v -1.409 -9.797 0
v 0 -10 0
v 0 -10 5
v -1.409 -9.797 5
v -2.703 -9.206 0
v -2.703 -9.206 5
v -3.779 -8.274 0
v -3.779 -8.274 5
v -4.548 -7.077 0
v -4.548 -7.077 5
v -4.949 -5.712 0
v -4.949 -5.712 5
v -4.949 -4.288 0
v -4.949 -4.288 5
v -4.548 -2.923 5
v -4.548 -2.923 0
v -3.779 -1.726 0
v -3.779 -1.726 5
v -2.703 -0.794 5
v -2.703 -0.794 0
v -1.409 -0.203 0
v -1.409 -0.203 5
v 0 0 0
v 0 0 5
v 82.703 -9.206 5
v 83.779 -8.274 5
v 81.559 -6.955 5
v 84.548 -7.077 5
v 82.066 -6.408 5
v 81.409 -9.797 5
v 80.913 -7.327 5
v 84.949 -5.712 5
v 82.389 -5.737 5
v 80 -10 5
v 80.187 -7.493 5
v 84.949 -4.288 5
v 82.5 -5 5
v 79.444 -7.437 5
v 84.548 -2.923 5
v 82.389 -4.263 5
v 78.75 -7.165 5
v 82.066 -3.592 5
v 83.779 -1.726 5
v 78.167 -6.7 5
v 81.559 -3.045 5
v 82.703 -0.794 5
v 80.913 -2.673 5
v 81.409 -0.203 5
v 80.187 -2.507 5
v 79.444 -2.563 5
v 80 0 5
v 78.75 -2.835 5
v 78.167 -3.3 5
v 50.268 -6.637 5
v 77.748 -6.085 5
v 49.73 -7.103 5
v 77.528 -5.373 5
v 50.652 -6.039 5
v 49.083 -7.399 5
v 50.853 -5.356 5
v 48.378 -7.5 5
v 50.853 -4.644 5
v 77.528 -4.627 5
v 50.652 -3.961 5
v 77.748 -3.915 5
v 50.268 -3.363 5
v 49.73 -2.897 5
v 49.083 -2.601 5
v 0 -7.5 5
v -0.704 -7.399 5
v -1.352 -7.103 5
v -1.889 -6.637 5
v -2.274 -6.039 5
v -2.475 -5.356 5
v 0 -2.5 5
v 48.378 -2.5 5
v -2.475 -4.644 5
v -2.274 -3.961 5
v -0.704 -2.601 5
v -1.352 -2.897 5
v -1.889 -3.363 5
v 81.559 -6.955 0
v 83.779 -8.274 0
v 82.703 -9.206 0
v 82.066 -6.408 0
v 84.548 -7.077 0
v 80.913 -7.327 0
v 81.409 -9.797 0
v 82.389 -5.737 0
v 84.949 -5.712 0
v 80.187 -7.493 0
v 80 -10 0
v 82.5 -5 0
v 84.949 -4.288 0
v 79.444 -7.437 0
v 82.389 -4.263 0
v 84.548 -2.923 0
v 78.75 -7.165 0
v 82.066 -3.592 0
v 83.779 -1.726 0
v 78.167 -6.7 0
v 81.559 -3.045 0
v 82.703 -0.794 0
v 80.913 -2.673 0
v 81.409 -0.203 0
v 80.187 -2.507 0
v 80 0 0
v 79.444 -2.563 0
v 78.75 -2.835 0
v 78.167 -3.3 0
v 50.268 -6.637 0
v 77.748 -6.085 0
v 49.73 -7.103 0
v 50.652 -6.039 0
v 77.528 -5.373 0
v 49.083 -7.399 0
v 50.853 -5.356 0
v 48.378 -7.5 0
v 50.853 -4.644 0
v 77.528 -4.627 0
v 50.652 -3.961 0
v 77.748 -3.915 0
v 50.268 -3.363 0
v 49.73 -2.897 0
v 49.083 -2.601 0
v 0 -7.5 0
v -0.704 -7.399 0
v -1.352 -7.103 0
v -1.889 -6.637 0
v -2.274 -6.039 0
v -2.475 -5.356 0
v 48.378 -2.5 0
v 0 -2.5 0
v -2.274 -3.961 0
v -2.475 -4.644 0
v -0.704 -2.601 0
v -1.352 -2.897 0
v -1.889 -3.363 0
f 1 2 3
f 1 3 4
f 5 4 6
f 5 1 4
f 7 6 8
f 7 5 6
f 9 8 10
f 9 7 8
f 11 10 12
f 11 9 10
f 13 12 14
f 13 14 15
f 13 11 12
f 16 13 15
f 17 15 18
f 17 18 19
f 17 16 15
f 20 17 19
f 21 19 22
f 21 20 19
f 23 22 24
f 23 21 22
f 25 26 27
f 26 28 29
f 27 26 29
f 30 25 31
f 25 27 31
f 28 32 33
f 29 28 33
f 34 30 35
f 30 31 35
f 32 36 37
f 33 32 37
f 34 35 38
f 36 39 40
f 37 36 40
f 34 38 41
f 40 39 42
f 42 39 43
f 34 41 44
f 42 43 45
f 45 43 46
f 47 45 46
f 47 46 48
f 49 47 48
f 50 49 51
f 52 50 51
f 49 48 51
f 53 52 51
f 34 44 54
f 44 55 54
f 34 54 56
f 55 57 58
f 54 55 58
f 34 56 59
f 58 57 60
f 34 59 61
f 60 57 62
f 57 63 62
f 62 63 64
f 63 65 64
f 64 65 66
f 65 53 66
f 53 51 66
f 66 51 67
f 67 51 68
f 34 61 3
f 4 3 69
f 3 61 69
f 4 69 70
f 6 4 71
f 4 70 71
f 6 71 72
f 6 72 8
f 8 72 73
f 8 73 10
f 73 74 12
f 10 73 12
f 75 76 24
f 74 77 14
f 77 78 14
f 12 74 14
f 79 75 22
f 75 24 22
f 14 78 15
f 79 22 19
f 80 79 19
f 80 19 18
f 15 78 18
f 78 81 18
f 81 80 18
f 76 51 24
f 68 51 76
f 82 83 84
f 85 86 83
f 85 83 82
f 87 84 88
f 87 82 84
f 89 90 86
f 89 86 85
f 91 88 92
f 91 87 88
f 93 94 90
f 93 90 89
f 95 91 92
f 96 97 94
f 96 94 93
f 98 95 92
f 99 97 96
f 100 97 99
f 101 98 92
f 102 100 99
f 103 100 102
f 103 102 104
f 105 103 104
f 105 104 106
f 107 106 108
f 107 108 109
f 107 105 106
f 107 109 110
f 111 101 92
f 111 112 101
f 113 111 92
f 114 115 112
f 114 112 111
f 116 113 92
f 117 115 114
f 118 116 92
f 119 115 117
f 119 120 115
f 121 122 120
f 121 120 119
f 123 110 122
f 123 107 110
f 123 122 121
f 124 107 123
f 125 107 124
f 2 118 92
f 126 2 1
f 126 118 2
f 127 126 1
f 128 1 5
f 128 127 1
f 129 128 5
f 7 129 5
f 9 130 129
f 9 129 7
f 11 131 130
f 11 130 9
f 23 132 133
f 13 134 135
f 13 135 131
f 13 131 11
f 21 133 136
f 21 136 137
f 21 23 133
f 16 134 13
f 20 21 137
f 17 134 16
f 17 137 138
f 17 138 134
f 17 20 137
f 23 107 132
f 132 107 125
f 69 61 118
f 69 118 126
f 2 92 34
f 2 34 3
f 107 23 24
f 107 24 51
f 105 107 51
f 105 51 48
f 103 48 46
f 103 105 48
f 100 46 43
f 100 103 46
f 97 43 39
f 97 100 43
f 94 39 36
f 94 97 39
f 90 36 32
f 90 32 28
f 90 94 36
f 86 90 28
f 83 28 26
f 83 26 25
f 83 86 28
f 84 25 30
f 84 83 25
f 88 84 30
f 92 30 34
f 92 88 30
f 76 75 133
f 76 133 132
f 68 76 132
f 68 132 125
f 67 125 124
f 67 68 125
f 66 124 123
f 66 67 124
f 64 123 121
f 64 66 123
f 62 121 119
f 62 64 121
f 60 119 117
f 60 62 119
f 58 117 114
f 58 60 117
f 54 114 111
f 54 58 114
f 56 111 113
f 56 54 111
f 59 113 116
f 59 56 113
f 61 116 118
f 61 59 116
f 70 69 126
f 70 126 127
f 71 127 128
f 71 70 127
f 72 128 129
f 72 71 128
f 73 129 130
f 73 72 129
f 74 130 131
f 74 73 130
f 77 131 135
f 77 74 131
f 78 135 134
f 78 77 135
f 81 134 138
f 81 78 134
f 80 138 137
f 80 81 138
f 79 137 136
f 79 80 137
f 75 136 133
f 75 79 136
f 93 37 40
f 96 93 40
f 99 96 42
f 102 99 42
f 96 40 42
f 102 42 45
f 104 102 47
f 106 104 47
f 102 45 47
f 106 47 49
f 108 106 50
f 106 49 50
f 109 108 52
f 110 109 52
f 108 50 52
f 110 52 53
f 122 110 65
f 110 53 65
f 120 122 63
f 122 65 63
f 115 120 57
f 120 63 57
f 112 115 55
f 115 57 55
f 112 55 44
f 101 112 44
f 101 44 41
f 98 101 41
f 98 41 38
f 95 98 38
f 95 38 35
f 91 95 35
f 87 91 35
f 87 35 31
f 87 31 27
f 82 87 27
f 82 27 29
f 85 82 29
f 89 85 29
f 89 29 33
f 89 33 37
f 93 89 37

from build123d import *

# Parameters (mm, degrees)
EXTRUDE_2_DEPTH     = 5
SKETCH_3_R          = 2.5
CUT_EXTRUDE_2_DEPTH = 15


with BuildPart() as part:
    # 草图2 → 凸台-拉伸2 (new body)
    with BuildSketch(Plane.XY):
        with BuildLine():
            Line((0, 0), (79.999999139, 0))
            ThreePointArc((79.999999139, 0), (85, -4.999999569), (80, -10))
            Line((80, -10), (0, -10))
            ThreePointArc((0, -10), (-5, -5), (0, 0))
        make_face()
    extrude(amount=EXTRUDE_2_DEPTH)

    # 草图3 → 切除-拉伸2 (cut)
    with BuildSketch(Plane.XY.offset(5)):
        with Locations((80, -5)):
            Circle(SKETCH_3_R)
        with BuildLine():
            Line((0, -2.5), (48.378214102, -2.5))
            ThreePointArc((48.378214102, -2.5), (50.878214102, -5), (48.378214102, -7.5))
            Line((48.378214102, -7.5), (0, -7.5))
            ThreePointArc((0, -7.5), (-2.5, -5), (0, -2.5))
        make_face()
    extrude(amount=-CUT_EXTRUDE_2_DEPTH, mode=Mode.SUBTRACT)


solid = part.part
